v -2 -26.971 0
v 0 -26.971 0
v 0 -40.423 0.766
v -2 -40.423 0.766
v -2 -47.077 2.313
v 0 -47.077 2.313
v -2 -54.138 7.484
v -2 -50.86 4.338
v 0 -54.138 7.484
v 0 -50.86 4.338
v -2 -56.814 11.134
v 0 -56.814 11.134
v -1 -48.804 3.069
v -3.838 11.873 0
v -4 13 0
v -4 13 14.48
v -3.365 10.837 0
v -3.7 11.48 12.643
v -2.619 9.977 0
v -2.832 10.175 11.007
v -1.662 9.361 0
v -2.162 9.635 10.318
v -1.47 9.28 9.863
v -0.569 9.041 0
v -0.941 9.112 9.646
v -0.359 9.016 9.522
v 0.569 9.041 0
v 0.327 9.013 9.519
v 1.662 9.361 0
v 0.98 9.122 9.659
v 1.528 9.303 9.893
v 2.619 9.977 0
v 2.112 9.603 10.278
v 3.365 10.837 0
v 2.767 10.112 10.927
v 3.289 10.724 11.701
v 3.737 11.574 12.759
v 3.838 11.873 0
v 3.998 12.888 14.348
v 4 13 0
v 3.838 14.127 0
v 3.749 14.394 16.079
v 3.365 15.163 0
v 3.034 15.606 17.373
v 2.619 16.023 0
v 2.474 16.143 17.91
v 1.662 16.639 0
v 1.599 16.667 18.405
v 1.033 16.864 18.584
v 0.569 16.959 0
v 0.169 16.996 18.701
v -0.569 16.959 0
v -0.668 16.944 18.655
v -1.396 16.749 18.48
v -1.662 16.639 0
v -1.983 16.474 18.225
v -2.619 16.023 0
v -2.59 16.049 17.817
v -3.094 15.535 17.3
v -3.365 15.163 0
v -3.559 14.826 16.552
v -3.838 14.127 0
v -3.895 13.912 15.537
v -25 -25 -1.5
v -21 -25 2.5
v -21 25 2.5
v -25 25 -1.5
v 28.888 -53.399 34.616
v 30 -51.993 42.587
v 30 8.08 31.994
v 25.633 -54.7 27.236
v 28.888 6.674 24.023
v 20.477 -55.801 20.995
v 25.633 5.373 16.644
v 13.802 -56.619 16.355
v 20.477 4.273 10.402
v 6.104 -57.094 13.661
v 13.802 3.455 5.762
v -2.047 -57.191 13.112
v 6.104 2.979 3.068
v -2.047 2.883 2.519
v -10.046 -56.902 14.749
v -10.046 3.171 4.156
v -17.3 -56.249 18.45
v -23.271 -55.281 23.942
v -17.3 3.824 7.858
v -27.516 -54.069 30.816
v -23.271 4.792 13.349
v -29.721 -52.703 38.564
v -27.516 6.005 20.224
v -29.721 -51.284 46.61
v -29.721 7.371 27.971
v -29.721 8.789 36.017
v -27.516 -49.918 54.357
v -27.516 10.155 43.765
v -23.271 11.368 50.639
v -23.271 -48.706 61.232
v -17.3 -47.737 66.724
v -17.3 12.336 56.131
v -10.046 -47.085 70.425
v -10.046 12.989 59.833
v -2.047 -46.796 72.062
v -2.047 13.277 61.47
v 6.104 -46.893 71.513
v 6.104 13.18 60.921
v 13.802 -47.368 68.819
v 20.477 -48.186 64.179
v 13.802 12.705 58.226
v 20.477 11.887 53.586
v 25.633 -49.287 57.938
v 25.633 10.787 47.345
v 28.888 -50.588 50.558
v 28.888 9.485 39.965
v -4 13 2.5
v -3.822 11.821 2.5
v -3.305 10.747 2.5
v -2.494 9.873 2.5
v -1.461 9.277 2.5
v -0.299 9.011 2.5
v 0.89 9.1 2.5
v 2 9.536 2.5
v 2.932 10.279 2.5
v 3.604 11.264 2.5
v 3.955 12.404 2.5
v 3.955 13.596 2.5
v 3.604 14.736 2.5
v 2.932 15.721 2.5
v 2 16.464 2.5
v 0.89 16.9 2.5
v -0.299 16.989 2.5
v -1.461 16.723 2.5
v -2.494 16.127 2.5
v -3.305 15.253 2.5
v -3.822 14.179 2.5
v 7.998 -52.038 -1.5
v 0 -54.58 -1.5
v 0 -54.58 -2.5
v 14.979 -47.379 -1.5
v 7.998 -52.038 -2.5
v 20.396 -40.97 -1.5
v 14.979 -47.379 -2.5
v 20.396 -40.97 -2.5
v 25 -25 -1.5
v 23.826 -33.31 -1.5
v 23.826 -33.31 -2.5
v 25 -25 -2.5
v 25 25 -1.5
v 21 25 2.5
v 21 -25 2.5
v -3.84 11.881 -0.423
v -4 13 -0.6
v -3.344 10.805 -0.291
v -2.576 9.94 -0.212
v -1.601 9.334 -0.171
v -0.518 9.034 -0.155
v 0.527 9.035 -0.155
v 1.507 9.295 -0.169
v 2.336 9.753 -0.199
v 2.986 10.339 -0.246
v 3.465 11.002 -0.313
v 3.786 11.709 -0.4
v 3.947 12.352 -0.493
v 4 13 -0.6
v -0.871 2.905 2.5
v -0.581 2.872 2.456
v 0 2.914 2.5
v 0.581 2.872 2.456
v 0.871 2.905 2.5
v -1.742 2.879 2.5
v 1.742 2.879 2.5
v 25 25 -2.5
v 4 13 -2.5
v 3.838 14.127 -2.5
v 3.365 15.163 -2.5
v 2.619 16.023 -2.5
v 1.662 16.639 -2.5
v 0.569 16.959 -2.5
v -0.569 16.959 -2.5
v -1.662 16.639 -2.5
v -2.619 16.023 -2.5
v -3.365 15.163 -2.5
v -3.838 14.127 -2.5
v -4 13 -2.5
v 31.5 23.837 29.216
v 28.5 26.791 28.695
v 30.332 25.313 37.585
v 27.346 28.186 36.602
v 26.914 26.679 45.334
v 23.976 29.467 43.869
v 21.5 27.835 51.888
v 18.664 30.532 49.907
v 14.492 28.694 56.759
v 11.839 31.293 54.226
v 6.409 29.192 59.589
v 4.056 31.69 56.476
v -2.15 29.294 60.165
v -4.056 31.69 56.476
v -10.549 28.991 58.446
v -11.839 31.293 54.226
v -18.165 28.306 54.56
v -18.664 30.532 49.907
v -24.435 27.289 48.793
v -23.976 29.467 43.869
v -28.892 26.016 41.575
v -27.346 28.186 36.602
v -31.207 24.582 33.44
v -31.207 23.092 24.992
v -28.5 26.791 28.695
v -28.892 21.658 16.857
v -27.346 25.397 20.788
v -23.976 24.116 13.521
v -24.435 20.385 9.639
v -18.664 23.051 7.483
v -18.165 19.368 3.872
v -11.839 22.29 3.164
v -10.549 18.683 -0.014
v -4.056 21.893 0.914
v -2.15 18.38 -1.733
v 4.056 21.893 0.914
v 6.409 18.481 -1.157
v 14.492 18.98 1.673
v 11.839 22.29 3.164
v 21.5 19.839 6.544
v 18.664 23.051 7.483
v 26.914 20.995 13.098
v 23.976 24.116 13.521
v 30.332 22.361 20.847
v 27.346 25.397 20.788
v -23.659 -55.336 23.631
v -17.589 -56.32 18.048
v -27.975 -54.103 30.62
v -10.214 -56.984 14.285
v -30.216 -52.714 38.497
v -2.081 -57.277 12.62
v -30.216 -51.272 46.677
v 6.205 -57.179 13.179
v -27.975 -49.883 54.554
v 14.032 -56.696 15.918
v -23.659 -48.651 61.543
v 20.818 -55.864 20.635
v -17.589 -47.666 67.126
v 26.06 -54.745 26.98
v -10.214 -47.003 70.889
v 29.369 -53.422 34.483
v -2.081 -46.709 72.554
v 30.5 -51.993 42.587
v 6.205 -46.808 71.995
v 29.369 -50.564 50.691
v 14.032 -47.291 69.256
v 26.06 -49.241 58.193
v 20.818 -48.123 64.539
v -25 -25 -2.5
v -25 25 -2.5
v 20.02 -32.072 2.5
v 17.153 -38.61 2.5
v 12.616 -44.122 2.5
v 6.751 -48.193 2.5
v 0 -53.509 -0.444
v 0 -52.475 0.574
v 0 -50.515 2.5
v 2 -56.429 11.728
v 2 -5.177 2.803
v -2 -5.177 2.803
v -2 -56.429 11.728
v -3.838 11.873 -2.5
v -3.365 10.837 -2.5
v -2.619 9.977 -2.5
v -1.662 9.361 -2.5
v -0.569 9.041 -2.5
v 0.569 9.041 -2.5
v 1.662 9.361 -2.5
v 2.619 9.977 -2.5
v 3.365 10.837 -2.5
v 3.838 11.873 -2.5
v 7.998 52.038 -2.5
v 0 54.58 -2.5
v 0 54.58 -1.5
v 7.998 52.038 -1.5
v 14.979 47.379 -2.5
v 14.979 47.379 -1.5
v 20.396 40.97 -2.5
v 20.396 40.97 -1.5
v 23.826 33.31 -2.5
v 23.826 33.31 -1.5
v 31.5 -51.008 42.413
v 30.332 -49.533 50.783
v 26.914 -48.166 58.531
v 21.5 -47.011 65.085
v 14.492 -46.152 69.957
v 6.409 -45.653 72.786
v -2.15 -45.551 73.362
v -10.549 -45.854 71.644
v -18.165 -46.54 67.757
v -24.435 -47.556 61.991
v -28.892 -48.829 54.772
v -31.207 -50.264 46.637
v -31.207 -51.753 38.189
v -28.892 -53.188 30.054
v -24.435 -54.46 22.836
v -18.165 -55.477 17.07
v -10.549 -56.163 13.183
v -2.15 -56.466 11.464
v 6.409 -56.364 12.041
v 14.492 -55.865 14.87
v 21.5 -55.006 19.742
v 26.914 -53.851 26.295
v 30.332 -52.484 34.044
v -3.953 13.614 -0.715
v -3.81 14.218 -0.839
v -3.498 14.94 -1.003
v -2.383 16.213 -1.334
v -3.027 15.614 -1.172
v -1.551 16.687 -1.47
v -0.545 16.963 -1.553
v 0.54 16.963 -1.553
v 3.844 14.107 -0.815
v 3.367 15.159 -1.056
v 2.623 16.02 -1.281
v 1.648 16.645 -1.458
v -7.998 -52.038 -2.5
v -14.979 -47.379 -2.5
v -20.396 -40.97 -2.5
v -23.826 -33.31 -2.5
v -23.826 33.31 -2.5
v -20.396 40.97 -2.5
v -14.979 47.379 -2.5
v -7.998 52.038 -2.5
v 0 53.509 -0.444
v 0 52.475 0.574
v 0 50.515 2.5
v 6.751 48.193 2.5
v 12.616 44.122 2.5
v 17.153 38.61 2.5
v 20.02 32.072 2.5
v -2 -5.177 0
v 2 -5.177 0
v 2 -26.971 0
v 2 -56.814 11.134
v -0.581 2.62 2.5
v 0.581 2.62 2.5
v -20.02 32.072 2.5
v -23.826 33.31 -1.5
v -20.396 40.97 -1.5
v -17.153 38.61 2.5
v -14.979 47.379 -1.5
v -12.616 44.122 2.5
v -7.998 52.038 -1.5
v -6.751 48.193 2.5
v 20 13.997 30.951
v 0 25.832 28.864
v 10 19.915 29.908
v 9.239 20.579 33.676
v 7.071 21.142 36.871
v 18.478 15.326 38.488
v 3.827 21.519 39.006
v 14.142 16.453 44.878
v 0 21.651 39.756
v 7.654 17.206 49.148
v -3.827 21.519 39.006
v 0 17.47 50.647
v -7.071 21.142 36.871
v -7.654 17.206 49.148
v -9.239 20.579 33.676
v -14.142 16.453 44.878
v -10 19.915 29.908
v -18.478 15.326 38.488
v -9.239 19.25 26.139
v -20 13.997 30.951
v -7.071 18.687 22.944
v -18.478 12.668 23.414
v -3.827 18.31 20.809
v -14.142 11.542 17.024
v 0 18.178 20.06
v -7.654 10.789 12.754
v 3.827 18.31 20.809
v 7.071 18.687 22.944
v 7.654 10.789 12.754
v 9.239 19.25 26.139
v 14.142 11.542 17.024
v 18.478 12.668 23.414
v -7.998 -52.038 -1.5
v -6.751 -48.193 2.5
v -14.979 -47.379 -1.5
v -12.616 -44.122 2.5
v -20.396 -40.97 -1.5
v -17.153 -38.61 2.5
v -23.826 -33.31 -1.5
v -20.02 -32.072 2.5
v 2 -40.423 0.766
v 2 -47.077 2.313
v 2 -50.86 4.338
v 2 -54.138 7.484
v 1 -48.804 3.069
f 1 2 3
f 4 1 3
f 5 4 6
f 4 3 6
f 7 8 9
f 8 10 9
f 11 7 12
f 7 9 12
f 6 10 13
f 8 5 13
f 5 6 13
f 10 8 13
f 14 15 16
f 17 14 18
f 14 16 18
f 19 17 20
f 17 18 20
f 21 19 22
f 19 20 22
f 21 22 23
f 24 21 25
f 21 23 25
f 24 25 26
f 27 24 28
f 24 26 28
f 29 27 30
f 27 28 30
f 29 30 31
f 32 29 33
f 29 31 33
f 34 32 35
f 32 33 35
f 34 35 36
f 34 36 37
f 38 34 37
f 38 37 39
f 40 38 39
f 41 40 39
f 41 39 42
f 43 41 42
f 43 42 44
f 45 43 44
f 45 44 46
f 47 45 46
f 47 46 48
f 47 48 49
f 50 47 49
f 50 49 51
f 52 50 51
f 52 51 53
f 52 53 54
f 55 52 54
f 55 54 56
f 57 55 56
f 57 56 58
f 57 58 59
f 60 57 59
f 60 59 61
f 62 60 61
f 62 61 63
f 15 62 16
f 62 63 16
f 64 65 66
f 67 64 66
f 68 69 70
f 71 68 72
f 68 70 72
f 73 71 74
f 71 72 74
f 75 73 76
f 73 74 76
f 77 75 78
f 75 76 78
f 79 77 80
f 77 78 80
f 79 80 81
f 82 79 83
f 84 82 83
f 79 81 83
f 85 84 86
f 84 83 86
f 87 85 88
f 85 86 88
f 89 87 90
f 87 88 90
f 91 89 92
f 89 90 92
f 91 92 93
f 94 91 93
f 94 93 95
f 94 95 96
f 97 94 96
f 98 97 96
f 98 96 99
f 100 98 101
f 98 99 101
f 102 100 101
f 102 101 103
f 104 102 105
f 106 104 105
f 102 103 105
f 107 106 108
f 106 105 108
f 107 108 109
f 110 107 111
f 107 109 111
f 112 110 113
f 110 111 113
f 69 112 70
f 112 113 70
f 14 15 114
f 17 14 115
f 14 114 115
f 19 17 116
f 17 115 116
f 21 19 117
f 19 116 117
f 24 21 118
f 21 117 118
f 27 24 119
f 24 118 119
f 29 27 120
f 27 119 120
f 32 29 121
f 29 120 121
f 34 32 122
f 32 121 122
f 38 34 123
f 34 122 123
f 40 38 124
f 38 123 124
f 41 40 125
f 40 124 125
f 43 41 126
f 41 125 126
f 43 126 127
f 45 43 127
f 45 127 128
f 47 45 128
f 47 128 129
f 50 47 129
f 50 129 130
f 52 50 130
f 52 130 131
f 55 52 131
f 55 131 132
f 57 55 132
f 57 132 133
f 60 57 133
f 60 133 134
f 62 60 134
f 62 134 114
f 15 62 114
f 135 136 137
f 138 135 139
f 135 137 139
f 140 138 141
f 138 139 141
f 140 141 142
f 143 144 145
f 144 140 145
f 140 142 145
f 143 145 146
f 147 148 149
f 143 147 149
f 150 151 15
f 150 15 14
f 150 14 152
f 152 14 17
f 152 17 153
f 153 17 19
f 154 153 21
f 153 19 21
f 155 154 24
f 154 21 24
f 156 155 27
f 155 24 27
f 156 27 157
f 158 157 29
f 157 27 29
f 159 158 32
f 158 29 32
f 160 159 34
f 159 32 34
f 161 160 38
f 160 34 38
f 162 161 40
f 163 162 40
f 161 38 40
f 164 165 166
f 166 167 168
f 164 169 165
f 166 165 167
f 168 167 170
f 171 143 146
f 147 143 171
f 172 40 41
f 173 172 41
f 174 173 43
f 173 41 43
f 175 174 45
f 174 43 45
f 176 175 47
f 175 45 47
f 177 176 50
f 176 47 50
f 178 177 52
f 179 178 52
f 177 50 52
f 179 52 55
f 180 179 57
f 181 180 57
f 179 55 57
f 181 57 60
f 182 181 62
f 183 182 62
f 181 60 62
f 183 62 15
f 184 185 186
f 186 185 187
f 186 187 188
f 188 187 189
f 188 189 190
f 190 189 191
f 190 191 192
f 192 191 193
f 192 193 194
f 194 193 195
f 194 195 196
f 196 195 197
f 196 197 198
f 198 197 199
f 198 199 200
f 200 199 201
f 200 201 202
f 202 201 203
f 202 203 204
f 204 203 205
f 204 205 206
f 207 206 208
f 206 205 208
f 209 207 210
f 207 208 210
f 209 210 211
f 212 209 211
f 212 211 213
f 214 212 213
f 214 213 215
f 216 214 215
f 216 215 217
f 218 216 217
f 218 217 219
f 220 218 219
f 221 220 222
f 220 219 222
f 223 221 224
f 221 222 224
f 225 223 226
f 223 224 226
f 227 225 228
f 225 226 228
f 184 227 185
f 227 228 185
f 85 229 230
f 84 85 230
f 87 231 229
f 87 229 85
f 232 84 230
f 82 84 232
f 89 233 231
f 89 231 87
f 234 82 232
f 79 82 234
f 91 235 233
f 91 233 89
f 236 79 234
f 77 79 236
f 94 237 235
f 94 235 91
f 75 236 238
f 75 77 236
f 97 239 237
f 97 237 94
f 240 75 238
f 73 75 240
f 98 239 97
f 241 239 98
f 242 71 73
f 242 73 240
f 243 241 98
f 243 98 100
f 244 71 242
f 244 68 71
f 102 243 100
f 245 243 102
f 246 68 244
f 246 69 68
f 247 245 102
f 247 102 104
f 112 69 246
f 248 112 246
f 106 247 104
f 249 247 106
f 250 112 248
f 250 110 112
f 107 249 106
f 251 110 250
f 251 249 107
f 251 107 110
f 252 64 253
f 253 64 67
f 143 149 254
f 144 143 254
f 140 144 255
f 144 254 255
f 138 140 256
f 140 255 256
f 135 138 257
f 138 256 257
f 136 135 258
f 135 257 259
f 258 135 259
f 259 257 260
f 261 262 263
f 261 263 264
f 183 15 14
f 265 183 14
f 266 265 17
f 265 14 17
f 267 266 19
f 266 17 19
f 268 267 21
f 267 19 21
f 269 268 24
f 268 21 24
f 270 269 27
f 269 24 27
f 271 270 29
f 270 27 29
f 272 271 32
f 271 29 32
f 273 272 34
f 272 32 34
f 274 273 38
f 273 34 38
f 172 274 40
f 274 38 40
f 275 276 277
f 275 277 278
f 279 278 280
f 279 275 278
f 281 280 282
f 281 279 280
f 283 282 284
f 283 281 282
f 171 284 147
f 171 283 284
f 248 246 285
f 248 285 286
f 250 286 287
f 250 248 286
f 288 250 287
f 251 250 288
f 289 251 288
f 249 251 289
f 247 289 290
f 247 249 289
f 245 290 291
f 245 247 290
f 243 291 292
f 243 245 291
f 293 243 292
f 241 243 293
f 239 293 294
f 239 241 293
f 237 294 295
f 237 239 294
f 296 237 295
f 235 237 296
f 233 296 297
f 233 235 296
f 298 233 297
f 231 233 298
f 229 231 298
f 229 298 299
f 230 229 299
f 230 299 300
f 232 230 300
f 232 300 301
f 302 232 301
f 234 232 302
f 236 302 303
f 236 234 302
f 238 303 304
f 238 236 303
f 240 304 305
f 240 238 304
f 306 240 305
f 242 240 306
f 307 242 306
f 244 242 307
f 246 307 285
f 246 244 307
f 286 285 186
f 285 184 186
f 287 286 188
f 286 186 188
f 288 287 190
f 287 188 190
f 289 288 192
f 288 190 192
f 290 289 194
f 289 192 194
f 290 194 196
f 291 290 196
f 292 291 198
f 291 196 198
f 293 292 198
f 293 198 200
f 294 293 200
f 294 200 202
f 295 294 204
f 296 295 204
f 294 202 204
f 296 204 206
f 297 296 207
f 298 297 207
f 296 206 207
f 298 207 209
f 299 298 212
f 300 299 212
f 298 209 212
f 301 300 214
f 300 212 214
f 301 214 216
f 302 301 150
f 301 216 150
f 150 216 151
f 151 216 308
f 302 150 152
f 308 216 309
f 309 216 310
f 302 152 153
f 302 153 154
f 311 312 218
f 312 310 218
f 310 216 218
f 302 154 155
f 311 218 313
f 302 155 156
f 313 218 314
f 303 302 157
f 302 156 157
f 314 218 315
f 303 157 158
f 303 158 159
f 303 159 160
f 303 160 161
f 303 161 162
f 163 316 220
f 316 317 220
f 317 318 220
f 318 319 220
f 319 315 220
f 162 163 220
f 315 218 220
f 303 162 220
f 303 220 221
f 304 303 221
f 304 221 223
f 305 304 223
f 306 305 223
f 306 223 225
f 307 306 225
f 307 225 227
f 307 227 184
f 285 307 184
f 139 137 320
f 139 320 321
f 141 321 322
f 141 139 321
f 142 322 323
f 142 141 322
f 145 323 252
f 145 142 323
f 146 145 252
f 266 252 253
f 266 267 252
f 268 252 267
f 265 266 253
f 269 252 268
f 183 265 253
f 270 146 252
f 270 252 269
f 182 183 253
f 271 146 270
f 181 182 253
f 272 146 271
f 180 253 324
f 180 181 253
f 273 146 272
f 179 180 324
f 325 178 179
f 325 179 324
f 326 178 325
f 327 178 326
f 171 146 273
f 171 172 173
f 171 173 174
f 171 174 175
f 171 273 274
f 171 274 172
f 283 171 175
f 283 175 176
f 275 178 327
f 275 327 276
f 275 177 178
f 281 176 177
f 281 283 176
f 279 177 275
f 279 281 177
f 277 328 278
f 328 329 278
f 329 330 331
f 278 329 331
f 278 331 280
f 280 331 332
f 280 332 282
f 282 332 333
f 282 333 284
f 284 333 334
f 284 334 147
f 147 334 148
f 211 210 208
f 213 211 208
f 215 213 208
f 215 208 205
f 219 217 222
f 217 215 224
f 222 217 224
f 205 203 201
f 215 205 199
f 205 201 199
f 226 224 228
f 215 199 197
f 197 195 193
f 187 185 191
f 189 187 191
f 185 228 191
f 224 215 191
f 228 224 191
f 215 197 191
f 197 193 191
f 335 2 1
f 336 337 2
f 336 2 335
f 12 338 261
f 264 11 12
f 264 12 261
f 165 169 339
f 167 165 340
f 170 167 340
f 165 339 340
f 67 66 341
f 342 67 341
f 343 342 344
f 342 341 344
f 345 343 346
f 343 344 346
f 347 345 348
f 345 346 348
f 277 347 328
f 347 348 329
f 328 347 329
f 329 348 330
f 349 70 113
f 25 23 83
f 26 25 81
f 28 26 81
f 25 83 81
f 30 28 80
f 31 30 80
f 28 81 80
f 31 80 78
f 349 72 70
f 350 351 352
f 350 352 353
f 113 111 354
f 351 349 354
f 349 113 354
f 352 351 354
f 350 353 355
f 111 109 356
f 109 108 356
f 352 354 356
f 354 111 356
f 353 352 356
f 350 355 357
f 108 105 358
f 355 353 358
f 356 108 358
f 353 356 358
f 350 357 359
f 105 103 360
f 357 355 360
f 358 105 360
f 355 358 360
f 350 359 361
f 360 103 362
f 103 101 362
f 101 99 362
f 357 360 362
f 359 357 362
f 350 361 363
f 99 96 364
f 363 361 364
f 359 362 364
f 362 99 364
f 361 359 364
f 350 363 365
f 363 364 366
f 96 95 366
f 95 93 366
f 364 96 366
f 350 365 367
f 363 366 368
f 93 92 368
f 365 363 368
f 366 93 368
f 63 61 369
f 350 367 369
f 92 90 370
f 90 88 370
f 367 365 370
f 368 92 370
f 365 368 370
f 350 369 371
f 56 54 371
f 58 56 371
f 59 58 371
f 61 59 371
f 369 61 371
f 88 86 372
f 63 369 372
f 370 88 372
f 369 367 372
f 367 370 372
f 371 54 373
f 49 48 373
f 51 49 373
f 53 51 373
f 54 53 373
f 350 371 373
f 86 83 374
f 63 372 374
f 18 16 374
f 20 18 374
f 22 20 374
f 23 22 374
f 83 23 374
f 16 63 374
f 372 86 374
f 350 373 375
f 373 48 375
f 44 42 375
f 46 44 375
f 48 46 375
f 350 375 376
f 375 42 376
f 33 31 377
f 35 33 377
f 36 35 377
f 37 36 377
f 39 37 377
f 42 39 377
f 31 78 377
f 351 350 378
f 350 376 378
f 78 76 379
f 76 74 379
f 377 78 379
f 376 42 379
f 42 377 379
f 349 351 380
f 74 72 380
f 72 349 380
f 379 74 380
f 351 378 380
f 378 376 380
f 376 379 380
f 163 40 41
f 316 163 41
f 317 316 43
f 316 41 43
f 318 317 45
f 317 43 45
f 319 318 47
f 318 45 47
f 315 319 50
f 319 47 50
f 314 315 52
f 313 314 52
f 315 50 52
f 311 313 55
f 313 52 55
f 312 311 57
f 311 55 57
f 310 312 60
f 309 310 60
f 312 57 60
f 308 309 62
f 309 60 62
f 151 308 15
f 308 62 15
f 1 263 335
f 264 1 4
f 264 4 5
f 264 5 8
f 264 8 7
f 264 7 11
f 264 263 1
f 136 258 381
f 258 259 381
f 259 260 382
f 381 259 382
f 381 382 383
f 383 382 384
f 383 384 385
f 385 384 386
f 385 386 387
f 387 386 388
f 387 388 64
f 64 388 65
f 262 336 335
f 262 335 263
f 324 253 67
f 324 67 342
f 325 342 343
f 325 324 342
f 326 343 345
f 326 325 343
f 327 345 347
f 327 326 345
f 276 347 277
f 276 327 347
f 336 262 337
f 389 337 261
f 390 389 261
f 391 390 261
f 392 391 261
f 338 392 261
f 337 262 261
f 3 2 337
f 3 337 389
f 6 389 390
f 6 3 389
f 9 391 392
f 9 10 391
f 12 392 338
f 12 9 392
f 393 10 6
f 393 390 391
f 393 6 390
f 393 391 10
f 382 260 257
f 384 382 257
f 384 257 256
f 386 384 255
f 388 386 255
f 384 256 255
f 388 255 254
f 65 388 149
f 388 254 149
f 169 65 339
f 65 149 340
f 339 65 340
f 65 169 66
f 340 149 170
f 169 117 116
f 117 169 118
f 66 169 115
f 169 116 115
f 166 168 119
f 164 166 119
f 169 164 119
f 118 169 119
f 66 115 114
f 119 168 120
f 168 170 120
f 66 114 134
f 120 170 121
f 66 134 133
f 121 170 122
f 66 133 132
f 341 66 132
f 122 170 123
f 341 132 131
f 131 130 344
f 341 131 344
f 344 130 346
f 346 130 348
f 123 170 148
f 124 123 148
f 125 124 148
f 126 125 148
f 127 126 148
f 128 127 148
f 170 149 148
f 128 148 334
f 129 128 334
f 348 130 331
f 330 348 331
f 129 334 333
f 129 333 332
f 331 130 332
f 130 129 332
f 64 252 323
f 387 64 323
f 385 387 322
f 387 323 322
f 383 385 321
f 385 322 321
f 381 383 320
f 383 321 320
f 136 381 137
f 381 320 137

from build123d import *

# Parameters (mm, degrees)
F0_W          = 110
F0_H          = 5
F1_DEPTH      = 25
F3_R          = 31.5
F4_DEPTH      = 76
F4_DEPTH_BACK = 4
F5_D          = 60
F5_DEPTH      = 57
F5_TIP        = 18.0258185708
F5_2_D        = 60
F5_2_DEPTH    = 57
F5_2_TIP      = 18.0258185708
F6_D          = 60
F6_DEPTH      = 45
F6_TIP        = 18.0258185708
F8_D          = 8
F8_DEPTH      = 47
F8_TIP        = 2.4034424761
F8_2_D        = 8
F8_2_DEPTH    = 47
F8_2_TIP      = 2.4034424761
F10_DEPTH     = 2
F11_T1_DEPTH  = 155
F12_SIZE      = 3
F13_SIZE      = 1
F14_SIZE      = 4
F15_D         = 8
F15_DEPTH     = 47
F15_TIP       = 2.4034424761
F15_2_D       = 8
F15_2_DEPTH   = 47
F15_2_TIP     = 2.4034424761
F16_T1_DEPTH  = 4.2916195716
F16_T3_DEPTH  = 4.2916195716


# Not quite as in the source:
# - a fillet or chamfer that OpenCascade refuses, or shapes differently, is made with other operations: its cross-section is extruded or revolved along the edge and cut away or added


with BuildPart() as f1:
    # F0 (on Right) → F1 (new body, symmetric)
    with BuildSketch(Plane.YZ):
        Rectangle(F0_W, F0_H)
    extrude(amount=F1_DEPTH, both=True)

    # F5 (one way)
    with BuildSketch(Plane(origin=(0, -53.7690722508, 9.4809381655), x_dir=(1, 0, 0), z_dir=(0, -0.984807753, 0.1736481777))):
        with Locations((0, 32.9113696108)):
            Circle(F5_D / 2)
    extrude(amount=-F5_DEPTH, mode=Mode.SUBTRACT)
    with Locations(Plane(origin=(0, -53.7690722508, 9.4809381655), x_dir=(1, 0, 0), z_dir=(0, -0.984807753, 0.1736481777))):
        with Locations((0, 32.9113696108)):
            with Locations((0, 0, -(F5_DEPTH + F5_TIP / 2))):  # 118° drill point
                Cone(0, F5_D / 2, F5_TIP, mode=Mode.SUBTRACT)

    # F8 (one way)
    with BuildSketch(Plane.XY):
        with Locations((0, 13)):
            Circle(F8_D / 2)
    extrude(amount=-F8_DEPTH, mode=Mode.SUBTRACT)
    with Locations(Plane.XY):
        with Locations((0, 13)):
            with Locations((0, 0, -(F8_DEPTH + F8_TIP / 2))):  # 118° drill point
                Cone(0, F8_D / 2, F8_TIP, mode=Mode.SUBTRACT)

    # F11: fillet of radius 30 on 4 edges, made by hand

    # F11_s2 → F11_t1 (cut)
    with BuildSketch(Plane.XY.offset(-77.5)):
        with BuildLine():
            ThreePointArc((-25, -25), (-16.2132034356, -46.2132034356), (5, -55))
            Line((5, -55), (-25, -55))
            Line((-25, -55), (-25, -25))
        make_face()
        with BuildLine():
            ThreePointArc((-5, -55), (16.2132034356, -46.2132034356), (25, -25))
            Line((25, -25), (25, -55))
            Line((25, -55), (-5, -55))
        make_face()
        with BuildLine():
            ThreePointArc((-25, 25), (-16.2132034356, 46.2132034356), (5, 55))
            Line((5, 55), (-25, 55))
            Line((-25, 55), (-25, 25))
        make_face()
        with BuildLine():
            ThreePointArc((-5, 55), (16.2132034356, 46.2132034356), (25, 25))
            Line((25, 25), (25, 55))
            Line((25, 55), (-5, 55))
        make_face()
    extrude(amount=F11_T1_DEPTH, mode=Mode.SUBTRACT)

    # F14
    f14_edges = [f1.edges().sort_by_distance(p)[0] for p in [
        (17.912878, -44.364917, 2.5),
        (25, 0, 2.5),
        (17.912878, 44.364917, 2.5),
        (-17.912878, 44.364917, 2.5),
        (-25, 0, 2.5),
        (-17.912878, -44.364917, 2.5),
    ]]
    chamfer(f14_edges, length=F14_SIZE)

    # F15
    with Locations(Plane(origin=(0, 0, 0), x_dir=(1, 0, 0), z_dir=(0, 0, -1))):
        with Locations((0, -13)):
            Hole(F15_D / 2, depth=F15_DEPTH)
            with Locations((0, 0, -(F15_DEPTH + F15_TIP / 2))):  # 118° drill point
                Cone(0, F15_D / 2, F15_TIP, mode=Mode.SUBTRACT)


with BuildPart() as f4:
    # F3 (on face) → F4 (new body, two sides)
    with BuildSketch(Plane(origin=(0, -53.7690722508, 9.4809381655), x_dir=(1, 0, 0), z_dir=(0, -0.984807753, 0.1736481777))) as f4_sk:
        with Locations((0, 32.9113696108)):
            Circle(F3_R)
    extrude(amount=-F4_DEPTH)
    extrude(f4_sk.sketch, amount=F4_DEPTH_BACK)

    # F5#2 (one way)
    with BuildSketch(Plane(origin=(0, -53.7690722508, 9.4809381655), x_dir=(1, 0, 0), z_dir=(0, -0.984807753, 0.1736481777))):
        with Locations((0, 32.9113696108)):
            Circle(F5_2_D / 2)
    extrude(amount=-F5_2_DEPTH, mode=Mode.SUBTRACT)
    with Locations(Plane(origin=(0, -53.7690722508, 9.4809381655), x_dir=(1, 0, 0), z_dir=(0, -0.984807753, 0.1736481777))):
        with Locations((0, 32.9113696108)):
            with Locations((0, 0, -(F5_2_DEPTH + F5_2_TIP / 2))):  # 118° drill point
                Cone(0, F5_2_D / 2, F5_2_TIP, mode=Mode.SUBTRACT)

    # F6 (one way)
    with BuildSketch(Plane(origin=(0, -53.7690722508, 9.4809381655), x_dir=(1, 0, 0), z_dir=(0, 0.984807753, -0.1736481777))):
        with Locations((0, -32.9113696108)):
            Circle(F6_D / 2)
    extrude(amount=-F6_DEPTH, mode=Mode.SUBTRACT)
    with Locations(Plane(origin=(0, -53.7690722508, 9.4809381655), x_dir=(1, 0, 0), z_dir=(0, 0.984807753, -0.1736481777))):
        with Locations((0, -32.9113696108)):
            with Locations((0, 0, -(F6_DEPTH + F6_TIP / 2))):  # 118° drill point
                Cone(0, F6_D / 2, F6_TIP, mode=Mode.SUBTRACT)

    # F8#2 (one way)
    with BuildSketch(Plane.XY):
        with Locations((0, 13)):
            Circle(F8_2_D / 2)
    extrude(amount=-F8_2_DEPTH, mode=Mode.SUBTRACT)
    with Locations(Plane.XY):
        with Locations((0, 13)):
            with Locations((0, 0, -(F8_2_DEPTH + F8_2_TIP / 2))):  # 118° drill point
                Cone(0, F8_2_D / 2, F8_2_TIP, mode=Mode.SUBTRACT)

    # F12
    f12_edges = [f4.edges().sort_by_distance(p)[0] for p in [
        (-31.5, 26.791316, 28.695049),
    ]]
    chamfer(f12_edges, length=F12_SIZE)

    # F13
    f13_edges = [f4.edges().sort_by_distance(p)[0] for p in [
        (-31.5, -51.993304, 42.586903),
    ]]
    chamfer(f13_edges, length=F13_SIZE)

    # F15#2
    with Locations(Plane(origin=(0, 0, 0), x_dir=(1, 0, 0), z_dir=(0, 0, -1))):
        with Locations((0, -13)):
            Hole(F15_2_D / 2, depth=F15_2_DEPTH)
            with Locations((0, 0, -(F15_2_DEPTH + F15_2_TIP / 2))):  # 118° drill point
                Cone(0, F15_2_D / 2, F15_2_TIP, mode=Mode.SUBTRACT)


with BuildPart() as f10:
    # F9 (on Right) → F10 (new body, symmetric)
    with BuildSketch(Plane.YZ):
        with BuildLine():
            add(Edge.make_bspline(
                [(-26.9709937274, 0), (-35.2430958686, 0.1872683322), (-49.6820188119, 0.5141444964), (-55.0321186352, 8.4802371226), (-57.3171302676, 11.8825314566)],
                knots=[0, 0, 0, 0, 0.572902991, 1, 1, 1, 1], degree=3))
            Line((-26.9709937274, 0), (-5.1770457067, 0))
            Line((-5.1770457067, 0), (-5.1770457067, 2.8025961947))
            Line((-5.1770457067, 2.8025961947), (-57.3171302676, 11.8825314566))
        make_face()
    extrude(amount=F10_DEPTH, both=True)

    # F16: chamfer of 0.9 on 2 edges, made by hand

    # F16_s2 → F16_t1 (cut)
    with BuildSketch(Plane.YZ.offset(-4.2916195716)):
        with BuildLine():
            Line((-56.8331442384, 11.1040709469), (-56.4097543552, 11.7581442044))
            Line((-56.4097543552, 11.7581442044), (-56.4066662215, 11.7758773211))
            ThreePointArc((-56.4066662215, 11.7758773211), (-56.8631960445, 11.8217519791), (-57.3140421339, 11.9002645734))
            Line((-57.3140421339, 11.9002645734), (-57.3320729998, 11.8724957826))
            ThreePointArc((-57.3320729998, 11.8724957826), (-57.0766052058, 11.4923137573), (-56.8480585259, 11.0939930489))
            Line((-56.8480585259, 11.0939930489), (-56.8331442384, 11.1040709469))
        make_face()
    extrude(amount=F16_T1_DEPTH, mode=Mode.SUBTRACT)

    # F16_s4 → F16_t3 (cut)
    with BuildSketch(Plane.YZ):
        with BuildLine():
            Line((-56.8331442384, 11.1040709469), (-56.4097543552, 11.7581442044))
            Line((-56.4097543552, 11.7581442044), (-56.4066662215, 11.7758773211))
            ThreePointArc((-56.4066662215, 11.7758773211), (-56.8631960445, 11.8217519791), (-57.3140421339, 11.9002645734))
            Line((-57.3140421339, 11.9002645734), (-57.3320729998, 11.8724957826))
            ThreePointArc((-57.3320729998, 11.8724957826), (-57.0766052058, 11.4923137573), (-56.8480585259, 11.0939930489))
            Line((-56.8480585259, 11.0939930489), (-56.8331442384, 11.1040709469))
        make_face()
    extrude(amount=F16_T3_DEPTH, mode=Mode.SUBTRACT)


solid = Compound([f1.part, f4.part, f10.part])
